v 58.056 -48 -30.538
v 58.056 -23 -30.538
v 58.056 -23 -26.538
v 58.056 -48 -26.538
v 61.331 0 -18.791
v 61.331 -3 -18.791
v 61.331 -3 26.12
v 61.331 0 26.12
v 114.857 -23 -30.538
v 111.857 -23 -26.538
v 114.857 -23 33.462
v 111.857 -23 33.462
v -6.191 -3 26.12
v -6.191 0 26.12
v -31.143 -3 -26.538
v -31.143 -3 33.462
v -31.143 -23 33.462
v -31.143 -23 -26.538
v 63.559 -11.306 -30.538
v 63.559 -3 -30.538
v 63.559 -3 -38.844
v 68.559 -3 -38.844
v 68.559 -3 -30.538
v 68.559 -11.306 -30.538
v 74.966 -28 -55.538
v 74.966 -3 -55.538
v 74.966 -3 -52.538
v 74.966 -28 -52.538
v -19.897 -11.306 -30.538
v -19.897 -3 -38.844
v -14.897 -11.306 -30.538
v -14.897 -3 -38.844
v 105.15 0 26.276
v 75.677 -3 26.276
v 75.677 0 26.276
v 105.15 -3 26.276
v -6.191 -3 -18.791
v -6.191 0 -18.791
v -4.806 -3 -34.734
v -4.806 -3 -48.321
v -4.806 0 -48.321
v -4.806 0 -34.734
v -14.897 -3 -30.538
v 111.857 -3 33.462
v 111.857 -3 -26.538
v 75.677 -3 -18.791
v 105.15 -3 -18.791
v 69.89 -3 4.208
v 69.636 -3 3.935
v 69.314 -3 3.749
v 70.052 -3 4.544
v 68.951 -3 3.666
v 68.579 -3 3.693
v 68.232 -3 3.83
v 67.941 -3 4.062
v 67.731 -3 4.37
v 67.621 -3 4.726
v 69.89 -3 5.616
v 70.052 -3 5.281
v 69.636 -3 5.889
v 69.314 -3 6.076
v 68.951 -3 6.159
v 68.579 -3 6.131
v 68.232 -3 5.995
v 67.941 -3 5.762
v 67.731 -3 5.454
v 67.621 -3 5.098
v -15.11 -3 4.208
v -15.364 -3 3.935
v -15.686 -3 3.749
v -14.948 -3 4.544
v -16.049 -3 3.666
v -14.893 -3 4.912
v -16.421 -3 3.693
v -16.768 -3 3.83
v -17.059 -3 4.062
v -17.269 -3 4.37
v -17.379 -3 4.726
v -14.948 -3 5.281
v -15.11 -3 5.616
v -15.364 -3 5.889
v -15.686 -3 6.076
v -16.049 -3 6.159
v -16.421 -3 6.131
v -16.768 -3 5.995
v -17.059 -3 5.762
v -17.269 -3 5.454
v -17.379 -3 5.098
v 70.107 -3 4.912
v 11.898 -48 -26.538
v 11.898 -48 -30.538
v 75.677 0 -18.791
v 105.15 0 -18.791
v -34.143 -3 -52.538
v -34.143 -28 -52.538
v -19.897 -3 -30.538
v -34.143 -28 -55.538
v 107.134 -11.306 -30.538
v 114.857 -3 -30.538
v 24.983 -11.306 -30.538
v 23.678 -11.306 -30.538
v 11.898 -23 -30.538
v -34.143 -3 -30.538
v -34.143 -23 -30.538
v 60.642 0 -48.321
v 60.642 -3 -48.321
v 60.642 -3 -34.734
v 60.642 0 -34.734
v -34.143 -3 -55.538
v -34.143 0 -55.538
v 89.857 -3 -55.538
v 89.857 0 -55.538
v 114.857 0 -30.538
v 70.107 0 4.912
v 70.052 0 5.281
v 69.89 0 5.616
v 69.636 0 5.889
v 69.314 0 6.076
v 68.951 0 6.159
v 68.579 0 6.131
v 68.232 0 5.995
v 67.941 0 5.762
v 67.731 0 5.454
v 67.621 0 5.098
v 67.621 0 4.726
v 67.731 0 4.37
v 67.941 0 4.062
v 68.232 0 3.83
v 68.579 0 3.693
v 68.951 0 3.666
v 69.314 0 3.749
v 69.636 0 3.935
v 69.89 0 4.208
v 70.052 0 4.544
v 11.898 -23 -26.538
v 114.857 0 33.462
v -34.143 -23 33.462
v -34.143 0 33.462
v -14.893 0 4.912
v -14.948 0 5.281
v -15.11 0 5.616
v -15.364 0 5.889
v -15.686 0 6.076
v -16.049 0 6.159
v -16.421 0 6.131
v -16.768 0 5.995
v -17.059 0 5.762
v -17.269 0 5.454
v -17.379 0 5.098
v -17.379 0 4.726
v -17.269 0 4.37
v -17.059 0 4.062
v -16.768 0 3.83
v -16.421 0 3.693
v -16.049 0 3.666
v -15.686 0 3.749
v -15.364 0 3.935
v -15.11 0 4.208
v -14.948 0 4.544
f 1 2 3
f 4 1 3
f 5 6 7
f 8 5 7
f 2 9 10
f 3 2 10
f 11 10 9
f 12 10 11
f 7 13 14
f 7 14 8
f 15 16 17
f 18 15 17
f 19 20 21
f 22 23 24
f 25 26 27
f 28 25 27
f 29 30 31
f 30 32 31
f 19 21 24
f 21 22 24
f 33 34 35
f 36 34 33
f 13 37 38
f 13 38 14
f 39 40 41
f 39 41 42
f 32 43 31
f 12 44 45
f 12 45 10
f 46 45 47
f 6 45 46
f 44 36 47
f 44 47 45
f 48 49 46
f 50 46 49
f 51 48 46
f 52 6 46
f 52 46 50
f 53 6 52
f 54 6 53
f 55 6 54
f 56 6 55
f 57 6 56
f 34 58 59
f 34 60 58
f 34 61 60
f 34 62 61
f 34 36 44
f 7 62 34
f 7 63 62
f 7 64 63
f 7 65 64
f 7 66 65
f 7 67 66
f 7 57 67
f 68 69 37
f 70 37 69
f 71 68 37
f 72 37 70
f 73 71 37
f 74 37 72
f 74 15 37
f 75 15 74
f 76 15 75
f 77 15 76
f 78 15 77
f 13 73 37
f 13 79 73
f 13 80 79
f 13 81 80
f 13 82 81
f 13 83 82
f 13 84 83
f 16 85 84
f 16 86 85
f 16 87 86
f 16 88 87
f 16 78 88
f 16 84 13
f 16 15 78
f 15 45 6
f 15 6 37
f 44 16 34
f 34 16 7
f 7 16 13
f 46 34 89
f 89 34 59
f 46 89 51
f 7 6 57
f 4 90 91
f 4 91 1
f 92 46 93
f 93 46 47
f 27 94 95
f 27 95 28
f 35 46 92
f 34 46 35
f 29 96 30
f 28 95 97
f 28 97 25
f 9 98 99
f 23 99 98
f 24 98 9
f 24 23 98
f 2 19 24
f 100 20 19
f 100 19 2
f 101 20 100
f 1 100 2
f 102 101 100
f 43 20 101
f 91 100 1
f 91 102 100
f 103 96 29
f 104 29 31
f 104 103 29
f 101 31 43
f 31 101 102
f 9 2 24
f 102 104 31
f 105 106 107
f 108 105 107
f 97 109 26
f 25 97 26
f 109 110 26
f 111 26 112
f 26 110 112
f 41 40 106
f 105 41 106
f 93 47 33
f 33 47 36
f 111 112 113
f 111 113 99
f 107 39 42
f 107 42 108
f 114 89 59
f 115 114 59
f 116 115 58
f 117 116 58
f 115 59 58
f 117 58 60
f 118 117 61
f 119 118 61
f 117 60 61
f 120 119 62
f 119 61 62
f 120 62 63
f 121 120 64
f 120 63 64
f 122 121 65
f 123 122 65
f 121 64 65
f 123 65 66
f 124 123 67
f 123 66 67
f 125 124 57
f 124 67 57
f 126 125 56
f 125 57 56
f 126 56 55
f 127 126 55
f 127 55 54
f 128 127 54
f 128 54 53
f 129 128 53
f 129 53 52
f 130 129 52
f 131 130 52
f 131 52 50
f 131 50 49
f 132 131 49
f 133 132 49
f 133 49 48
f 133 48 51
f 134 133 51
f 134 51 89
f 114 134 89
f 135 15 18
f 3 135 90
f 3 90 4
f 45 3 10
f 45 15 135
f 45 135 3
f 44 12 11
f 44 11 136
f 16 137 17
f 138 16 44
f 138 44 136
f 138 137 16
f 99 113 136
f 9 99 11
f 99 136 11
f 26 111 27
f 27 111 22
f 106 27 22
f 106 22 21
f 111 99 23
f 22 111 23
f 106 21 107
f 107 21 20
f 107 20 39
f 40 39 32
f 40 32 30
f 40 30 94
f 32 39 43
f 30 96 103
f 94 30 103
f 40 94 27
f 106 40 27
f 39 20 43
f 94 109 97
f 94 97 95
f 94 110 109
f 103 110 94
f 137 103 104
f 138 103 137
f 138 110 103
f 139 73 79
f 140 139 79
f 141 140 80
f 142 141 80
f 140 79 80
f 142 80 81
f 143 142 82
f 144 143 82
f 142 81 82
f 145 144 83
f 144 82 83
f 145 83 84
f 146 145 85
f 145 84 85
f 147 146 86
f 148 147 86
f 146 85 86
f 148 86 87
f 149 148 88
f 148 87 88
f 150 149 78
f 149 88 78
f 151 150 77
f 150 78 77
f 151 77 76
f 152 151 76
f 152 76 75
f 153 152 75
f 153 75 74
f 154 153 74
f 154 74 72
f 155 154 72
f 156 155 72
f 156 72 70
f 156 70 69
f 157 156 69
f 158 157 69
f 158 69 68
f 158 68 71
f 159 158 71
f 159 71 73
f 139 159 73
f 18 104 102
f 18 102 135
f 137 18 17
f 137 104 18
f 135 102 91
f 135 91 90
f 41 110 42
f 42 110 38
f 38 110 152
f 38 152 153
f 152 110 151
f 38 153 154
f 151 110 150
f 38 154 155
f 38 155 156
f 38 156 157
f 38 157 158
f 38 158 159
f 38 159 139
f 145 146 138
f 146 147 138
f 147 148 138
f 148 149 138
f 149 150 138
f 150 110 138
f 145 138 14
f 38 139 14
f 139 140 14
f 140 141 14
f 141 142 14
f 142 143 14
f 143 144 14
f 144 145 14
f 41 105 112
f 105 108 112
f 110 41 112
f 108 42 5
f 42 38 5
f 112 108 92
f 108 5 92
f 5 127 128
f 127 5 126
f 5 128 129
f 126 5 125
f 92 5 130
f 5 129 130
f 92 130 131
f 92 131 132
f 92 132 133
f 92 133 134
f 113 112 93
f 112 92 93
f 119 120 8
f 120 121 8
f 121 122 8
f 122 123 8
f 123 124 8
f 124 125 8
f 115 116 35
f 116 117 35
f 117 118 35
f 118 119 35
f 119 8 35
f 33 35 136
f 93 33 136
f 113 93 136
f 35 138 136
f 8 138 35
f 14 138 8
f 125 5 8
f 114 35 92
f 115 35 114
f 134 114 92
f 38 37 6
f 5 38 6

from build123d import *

# Parameters (mm, degrees)
F0_W         = 147
F0_H         = 60
F1_DEPTH     = 3
F2_W         = 3
F2_H         = 60
F3_DEPTH     = 20
F4_DEPTH     = 4
F5_W         = 141
F5_H         = 4
F6_DEPTH     = 20
F7_DEPTH     = 2
F8_DEPTH     = 2
F10_W        = 5
F10_H        = 11.305693537
F11_DEPTH    = 15
F9_R         = 1.25
F12_DEPTH    = 25
F13_T4_DEPTH = 82.150489639
F13_T9_DEPTH = 82.150489639
F14_W        = 14.2459415197
F14_H        = 3
F14_W_2      = 46.2986054569
F14_W_3      = 5
F14_W_4      = 78.4554530233
F15_DEPTH    = 25
F16_SIZE     = 25
F17_W        = 109.1084168532
F17_H        = 3
F18_DEPTH    = 25
F19_W        = 67.5222836435
F19_H        = 44.9108928442
F19_W_2      = 29.4727757573
F19_H_2      = 45.0668334961
F20_DEPTH    = 25
F21_W        = 65.4478734359
F21_H        = 13.5871618986
F22_DEPTH    = 25
F23_W        = 46.1584180593
F23_H        = 4
F24_DEPTH    = 25


# Not quite as in the source:
# - a fillet or chamfer that OpenCascade refuses, or shapes differently, is made with other operations: its cross-section is extruded or revolved along the edge and cut away or added


with BuildPart() as f1:
    # F0 (on Front) → F1 (new body)
    with BuildSketch(Plane.XZ):
        with Locations((39.3571183681, 3.4620302916)):
            Rectangle(F0_W, F0_H)
    extrude(amount=F1_DEPTH)

    # F2 (on face) → F3 (join)
    with BuildSketch(Plane.XZ.offset(3)):
        with Locations((-32.6428816319, 3.4620302916)):
            Rectangle(F2_W, F2_H)
        with Locations((111.3571183681, 3.4620302916)):
            Rectangle(F2_W, F2_H)
    extrude(amount=F3_DEPTH)

    # F4 (add): a face of the model
    f4_faces = [f1.faces().sort_by_distance(p)[0] for p in [
        (-32.6549972277, -11.5, -26.5379697084),
    ]]
    extrude(f4_faces, amount=F4_DEPTH)

    # F5 (on face) → F6 (join)
    with BuildSketch(Plane.XZ.offset(3)):
        with Locations((39.3571183681, -28.5379697084)):
            Rectangle(F5_W, F5_H)
    extrude(amount=F6_DEPTH)

    # F7 (add): a face of the model
    f7_faces = [f1.faces().sort_by_distance(p)[0] for p in [
        (112.8571183681, -11.5, 1.4620302916),
    ]]
    extrude(f7_faces, amount=F7_DEPTH)

    # F8 (cut): a face of the model
    f8_faces = [f1.faces().sort_by_distance(p)[0] for p in [
        (109.8571183681, -13, 3.4620302916),
    ]]
    extrude(f8_faces, amount=-F8_DEPTH, mode=Mode.SUBTRACT)

    # F10 (on face) → F11 (join)
    with BuildSketch(Plane(origin=(0, 0, -30.5379697084), x_dir=(1, 0, 0), z_dir=(0, 0, -1))):
        with Locations((-17.3969401121, 5.6528467685)):
            Rectangle(F10_W, F10_H)
        with Locations((66.0585129112, 5.6528467685)):
            Rectangle(F10_W, F10_H)
    extrude(amount=F11_DEPTH)

    # F9 (on face) → F12 (cut)
    with BuildSketch(Plane.XZ.offset(3)):
        with Locations((-16.1428816319, 4.912131466)):
            Circle(F9_R)
        with Locations((68.8571183681, 4.912131466)):
            Circle(F9_R)
    extrude(amount=-F12_DEPTH, mode=Mode.SUBTRACT)

    # F13: chamfer of 15 on 2 edges, made by hand


with BuildPart() as f13_tool2:
    # F13_s3 → F13_t4 (new body)
    with BuildSketch(Plane.YZ.offset(23.6783047074)):
        Polygon((3.694306463, -45.5379697084), (-11.305693537, -30.5379697084), (-11.305693537, -45.5379697084), align=None)
    extrude(amount=-F13_T4_DEPTH)

    split(bisect_by=Plane.XY.offset(-30.5379697084), keep=Keep.BOTTOM)


with BuildPart() as f1_1:
    add(f1.part)

    # F13_t1: cut F13_tool2
    add(f13_tool2.part, mode=Mode.SUBTRACT)


with BuildPart() as f13_tool7:
    # F13_s8 → F13_t9 (new body)
    with BuildSketch(Plane.YZ.offset(107.1337577307)):
        Polygon((3.694306463, -45.5379697084), (-11.305693537, -30.5379697084), (-11.305693537, -45.5379697084), align=None)
    extrude(amount=-F13_T9_DEPTH)

    split(bisect_by=Plane.XY.offset(-30.5379697084), keep=Keep.BOTTOM)


with BuildPart() as f1_2:
    add(f1_1.part)

    # F13_t6: cut F13_tool7
    add(f13_tool7.part, mode=Mode.SUBTRACT)

    # F14 (on face) → F15 (join)
    with BuildSketch(Plane(origin=(0, 0, -30.5379697084), x_dir=(1, 0, 0), z_dir=(0, 0, -1))):
        with Locations((-27.019910872, 1.5)):
            Rectangle(F14_W, F14_H)
        with Locations((91.7078156397, 1.5)):
            Rectangle(F14_W_2, F14_H)
        with Locations((-17.3969401121, 1.5)):
            Rectangle(F14_W_3, F14_H)
        with Locations((66.0585129112, 1.5)):
            Rectangle(F14_W_3, F14_H)
        with Locations((24.3307863995, 1.5)):
            Rectangle(F14_W_4, F14_H)
    extrude(amount=F15_DEPTH)

    # F16
    f16_edges = [f1_2.edges().sort_by_distance(p)[0] for p in [
        (114.857118, -1.5, -55.53797),
    ]]
    chamfer(f16_edges, length=F16_SIZE)

    # F17 (on face) → F18 (join)
    with BuildSketch(Plane.XZ.offset(3)):
        with Locations((20.4113267948, -54.0379697084)):
            Rectangle(F17_W, F17_H)
    extrude(amount=F18_DEPTH)

    # F19 (on face) → F20 (cut)
    with BuildSketch(Plane.XZ.offset(3)):
        with Locations((27.5696460158, 3.6646034569)):
            Rectangle(F19_W, F19_H)
        with Locations((90.4137082398, 3.7425737828)):
            Rectangle(F19_W_2, F19_H_2)
    extrude(amount=-F20_DEPTH, mode=Mode.SUBTRACT)

    # F21 (on face) → F22 (cut)
    with BuildSketch(Plane.XZ.offset(3)):
        with Locations((27.9176128097, -41.5276624262)):
            Rectangle(F21_W, F21_H)
    extrude(amount=-F22_DEPTH, mode=Mode.SUBTRACT)

    # F23 (on face) → F24 (join)
    with BuildSketch(Plane.XZ.offset(23)):
        with Locations((34.9768251181, -28.5379697084)):
            Rectangle(F23_W, F23_H)
    extrude(amount=F24_DEPTH)


solid = f1_2.part
